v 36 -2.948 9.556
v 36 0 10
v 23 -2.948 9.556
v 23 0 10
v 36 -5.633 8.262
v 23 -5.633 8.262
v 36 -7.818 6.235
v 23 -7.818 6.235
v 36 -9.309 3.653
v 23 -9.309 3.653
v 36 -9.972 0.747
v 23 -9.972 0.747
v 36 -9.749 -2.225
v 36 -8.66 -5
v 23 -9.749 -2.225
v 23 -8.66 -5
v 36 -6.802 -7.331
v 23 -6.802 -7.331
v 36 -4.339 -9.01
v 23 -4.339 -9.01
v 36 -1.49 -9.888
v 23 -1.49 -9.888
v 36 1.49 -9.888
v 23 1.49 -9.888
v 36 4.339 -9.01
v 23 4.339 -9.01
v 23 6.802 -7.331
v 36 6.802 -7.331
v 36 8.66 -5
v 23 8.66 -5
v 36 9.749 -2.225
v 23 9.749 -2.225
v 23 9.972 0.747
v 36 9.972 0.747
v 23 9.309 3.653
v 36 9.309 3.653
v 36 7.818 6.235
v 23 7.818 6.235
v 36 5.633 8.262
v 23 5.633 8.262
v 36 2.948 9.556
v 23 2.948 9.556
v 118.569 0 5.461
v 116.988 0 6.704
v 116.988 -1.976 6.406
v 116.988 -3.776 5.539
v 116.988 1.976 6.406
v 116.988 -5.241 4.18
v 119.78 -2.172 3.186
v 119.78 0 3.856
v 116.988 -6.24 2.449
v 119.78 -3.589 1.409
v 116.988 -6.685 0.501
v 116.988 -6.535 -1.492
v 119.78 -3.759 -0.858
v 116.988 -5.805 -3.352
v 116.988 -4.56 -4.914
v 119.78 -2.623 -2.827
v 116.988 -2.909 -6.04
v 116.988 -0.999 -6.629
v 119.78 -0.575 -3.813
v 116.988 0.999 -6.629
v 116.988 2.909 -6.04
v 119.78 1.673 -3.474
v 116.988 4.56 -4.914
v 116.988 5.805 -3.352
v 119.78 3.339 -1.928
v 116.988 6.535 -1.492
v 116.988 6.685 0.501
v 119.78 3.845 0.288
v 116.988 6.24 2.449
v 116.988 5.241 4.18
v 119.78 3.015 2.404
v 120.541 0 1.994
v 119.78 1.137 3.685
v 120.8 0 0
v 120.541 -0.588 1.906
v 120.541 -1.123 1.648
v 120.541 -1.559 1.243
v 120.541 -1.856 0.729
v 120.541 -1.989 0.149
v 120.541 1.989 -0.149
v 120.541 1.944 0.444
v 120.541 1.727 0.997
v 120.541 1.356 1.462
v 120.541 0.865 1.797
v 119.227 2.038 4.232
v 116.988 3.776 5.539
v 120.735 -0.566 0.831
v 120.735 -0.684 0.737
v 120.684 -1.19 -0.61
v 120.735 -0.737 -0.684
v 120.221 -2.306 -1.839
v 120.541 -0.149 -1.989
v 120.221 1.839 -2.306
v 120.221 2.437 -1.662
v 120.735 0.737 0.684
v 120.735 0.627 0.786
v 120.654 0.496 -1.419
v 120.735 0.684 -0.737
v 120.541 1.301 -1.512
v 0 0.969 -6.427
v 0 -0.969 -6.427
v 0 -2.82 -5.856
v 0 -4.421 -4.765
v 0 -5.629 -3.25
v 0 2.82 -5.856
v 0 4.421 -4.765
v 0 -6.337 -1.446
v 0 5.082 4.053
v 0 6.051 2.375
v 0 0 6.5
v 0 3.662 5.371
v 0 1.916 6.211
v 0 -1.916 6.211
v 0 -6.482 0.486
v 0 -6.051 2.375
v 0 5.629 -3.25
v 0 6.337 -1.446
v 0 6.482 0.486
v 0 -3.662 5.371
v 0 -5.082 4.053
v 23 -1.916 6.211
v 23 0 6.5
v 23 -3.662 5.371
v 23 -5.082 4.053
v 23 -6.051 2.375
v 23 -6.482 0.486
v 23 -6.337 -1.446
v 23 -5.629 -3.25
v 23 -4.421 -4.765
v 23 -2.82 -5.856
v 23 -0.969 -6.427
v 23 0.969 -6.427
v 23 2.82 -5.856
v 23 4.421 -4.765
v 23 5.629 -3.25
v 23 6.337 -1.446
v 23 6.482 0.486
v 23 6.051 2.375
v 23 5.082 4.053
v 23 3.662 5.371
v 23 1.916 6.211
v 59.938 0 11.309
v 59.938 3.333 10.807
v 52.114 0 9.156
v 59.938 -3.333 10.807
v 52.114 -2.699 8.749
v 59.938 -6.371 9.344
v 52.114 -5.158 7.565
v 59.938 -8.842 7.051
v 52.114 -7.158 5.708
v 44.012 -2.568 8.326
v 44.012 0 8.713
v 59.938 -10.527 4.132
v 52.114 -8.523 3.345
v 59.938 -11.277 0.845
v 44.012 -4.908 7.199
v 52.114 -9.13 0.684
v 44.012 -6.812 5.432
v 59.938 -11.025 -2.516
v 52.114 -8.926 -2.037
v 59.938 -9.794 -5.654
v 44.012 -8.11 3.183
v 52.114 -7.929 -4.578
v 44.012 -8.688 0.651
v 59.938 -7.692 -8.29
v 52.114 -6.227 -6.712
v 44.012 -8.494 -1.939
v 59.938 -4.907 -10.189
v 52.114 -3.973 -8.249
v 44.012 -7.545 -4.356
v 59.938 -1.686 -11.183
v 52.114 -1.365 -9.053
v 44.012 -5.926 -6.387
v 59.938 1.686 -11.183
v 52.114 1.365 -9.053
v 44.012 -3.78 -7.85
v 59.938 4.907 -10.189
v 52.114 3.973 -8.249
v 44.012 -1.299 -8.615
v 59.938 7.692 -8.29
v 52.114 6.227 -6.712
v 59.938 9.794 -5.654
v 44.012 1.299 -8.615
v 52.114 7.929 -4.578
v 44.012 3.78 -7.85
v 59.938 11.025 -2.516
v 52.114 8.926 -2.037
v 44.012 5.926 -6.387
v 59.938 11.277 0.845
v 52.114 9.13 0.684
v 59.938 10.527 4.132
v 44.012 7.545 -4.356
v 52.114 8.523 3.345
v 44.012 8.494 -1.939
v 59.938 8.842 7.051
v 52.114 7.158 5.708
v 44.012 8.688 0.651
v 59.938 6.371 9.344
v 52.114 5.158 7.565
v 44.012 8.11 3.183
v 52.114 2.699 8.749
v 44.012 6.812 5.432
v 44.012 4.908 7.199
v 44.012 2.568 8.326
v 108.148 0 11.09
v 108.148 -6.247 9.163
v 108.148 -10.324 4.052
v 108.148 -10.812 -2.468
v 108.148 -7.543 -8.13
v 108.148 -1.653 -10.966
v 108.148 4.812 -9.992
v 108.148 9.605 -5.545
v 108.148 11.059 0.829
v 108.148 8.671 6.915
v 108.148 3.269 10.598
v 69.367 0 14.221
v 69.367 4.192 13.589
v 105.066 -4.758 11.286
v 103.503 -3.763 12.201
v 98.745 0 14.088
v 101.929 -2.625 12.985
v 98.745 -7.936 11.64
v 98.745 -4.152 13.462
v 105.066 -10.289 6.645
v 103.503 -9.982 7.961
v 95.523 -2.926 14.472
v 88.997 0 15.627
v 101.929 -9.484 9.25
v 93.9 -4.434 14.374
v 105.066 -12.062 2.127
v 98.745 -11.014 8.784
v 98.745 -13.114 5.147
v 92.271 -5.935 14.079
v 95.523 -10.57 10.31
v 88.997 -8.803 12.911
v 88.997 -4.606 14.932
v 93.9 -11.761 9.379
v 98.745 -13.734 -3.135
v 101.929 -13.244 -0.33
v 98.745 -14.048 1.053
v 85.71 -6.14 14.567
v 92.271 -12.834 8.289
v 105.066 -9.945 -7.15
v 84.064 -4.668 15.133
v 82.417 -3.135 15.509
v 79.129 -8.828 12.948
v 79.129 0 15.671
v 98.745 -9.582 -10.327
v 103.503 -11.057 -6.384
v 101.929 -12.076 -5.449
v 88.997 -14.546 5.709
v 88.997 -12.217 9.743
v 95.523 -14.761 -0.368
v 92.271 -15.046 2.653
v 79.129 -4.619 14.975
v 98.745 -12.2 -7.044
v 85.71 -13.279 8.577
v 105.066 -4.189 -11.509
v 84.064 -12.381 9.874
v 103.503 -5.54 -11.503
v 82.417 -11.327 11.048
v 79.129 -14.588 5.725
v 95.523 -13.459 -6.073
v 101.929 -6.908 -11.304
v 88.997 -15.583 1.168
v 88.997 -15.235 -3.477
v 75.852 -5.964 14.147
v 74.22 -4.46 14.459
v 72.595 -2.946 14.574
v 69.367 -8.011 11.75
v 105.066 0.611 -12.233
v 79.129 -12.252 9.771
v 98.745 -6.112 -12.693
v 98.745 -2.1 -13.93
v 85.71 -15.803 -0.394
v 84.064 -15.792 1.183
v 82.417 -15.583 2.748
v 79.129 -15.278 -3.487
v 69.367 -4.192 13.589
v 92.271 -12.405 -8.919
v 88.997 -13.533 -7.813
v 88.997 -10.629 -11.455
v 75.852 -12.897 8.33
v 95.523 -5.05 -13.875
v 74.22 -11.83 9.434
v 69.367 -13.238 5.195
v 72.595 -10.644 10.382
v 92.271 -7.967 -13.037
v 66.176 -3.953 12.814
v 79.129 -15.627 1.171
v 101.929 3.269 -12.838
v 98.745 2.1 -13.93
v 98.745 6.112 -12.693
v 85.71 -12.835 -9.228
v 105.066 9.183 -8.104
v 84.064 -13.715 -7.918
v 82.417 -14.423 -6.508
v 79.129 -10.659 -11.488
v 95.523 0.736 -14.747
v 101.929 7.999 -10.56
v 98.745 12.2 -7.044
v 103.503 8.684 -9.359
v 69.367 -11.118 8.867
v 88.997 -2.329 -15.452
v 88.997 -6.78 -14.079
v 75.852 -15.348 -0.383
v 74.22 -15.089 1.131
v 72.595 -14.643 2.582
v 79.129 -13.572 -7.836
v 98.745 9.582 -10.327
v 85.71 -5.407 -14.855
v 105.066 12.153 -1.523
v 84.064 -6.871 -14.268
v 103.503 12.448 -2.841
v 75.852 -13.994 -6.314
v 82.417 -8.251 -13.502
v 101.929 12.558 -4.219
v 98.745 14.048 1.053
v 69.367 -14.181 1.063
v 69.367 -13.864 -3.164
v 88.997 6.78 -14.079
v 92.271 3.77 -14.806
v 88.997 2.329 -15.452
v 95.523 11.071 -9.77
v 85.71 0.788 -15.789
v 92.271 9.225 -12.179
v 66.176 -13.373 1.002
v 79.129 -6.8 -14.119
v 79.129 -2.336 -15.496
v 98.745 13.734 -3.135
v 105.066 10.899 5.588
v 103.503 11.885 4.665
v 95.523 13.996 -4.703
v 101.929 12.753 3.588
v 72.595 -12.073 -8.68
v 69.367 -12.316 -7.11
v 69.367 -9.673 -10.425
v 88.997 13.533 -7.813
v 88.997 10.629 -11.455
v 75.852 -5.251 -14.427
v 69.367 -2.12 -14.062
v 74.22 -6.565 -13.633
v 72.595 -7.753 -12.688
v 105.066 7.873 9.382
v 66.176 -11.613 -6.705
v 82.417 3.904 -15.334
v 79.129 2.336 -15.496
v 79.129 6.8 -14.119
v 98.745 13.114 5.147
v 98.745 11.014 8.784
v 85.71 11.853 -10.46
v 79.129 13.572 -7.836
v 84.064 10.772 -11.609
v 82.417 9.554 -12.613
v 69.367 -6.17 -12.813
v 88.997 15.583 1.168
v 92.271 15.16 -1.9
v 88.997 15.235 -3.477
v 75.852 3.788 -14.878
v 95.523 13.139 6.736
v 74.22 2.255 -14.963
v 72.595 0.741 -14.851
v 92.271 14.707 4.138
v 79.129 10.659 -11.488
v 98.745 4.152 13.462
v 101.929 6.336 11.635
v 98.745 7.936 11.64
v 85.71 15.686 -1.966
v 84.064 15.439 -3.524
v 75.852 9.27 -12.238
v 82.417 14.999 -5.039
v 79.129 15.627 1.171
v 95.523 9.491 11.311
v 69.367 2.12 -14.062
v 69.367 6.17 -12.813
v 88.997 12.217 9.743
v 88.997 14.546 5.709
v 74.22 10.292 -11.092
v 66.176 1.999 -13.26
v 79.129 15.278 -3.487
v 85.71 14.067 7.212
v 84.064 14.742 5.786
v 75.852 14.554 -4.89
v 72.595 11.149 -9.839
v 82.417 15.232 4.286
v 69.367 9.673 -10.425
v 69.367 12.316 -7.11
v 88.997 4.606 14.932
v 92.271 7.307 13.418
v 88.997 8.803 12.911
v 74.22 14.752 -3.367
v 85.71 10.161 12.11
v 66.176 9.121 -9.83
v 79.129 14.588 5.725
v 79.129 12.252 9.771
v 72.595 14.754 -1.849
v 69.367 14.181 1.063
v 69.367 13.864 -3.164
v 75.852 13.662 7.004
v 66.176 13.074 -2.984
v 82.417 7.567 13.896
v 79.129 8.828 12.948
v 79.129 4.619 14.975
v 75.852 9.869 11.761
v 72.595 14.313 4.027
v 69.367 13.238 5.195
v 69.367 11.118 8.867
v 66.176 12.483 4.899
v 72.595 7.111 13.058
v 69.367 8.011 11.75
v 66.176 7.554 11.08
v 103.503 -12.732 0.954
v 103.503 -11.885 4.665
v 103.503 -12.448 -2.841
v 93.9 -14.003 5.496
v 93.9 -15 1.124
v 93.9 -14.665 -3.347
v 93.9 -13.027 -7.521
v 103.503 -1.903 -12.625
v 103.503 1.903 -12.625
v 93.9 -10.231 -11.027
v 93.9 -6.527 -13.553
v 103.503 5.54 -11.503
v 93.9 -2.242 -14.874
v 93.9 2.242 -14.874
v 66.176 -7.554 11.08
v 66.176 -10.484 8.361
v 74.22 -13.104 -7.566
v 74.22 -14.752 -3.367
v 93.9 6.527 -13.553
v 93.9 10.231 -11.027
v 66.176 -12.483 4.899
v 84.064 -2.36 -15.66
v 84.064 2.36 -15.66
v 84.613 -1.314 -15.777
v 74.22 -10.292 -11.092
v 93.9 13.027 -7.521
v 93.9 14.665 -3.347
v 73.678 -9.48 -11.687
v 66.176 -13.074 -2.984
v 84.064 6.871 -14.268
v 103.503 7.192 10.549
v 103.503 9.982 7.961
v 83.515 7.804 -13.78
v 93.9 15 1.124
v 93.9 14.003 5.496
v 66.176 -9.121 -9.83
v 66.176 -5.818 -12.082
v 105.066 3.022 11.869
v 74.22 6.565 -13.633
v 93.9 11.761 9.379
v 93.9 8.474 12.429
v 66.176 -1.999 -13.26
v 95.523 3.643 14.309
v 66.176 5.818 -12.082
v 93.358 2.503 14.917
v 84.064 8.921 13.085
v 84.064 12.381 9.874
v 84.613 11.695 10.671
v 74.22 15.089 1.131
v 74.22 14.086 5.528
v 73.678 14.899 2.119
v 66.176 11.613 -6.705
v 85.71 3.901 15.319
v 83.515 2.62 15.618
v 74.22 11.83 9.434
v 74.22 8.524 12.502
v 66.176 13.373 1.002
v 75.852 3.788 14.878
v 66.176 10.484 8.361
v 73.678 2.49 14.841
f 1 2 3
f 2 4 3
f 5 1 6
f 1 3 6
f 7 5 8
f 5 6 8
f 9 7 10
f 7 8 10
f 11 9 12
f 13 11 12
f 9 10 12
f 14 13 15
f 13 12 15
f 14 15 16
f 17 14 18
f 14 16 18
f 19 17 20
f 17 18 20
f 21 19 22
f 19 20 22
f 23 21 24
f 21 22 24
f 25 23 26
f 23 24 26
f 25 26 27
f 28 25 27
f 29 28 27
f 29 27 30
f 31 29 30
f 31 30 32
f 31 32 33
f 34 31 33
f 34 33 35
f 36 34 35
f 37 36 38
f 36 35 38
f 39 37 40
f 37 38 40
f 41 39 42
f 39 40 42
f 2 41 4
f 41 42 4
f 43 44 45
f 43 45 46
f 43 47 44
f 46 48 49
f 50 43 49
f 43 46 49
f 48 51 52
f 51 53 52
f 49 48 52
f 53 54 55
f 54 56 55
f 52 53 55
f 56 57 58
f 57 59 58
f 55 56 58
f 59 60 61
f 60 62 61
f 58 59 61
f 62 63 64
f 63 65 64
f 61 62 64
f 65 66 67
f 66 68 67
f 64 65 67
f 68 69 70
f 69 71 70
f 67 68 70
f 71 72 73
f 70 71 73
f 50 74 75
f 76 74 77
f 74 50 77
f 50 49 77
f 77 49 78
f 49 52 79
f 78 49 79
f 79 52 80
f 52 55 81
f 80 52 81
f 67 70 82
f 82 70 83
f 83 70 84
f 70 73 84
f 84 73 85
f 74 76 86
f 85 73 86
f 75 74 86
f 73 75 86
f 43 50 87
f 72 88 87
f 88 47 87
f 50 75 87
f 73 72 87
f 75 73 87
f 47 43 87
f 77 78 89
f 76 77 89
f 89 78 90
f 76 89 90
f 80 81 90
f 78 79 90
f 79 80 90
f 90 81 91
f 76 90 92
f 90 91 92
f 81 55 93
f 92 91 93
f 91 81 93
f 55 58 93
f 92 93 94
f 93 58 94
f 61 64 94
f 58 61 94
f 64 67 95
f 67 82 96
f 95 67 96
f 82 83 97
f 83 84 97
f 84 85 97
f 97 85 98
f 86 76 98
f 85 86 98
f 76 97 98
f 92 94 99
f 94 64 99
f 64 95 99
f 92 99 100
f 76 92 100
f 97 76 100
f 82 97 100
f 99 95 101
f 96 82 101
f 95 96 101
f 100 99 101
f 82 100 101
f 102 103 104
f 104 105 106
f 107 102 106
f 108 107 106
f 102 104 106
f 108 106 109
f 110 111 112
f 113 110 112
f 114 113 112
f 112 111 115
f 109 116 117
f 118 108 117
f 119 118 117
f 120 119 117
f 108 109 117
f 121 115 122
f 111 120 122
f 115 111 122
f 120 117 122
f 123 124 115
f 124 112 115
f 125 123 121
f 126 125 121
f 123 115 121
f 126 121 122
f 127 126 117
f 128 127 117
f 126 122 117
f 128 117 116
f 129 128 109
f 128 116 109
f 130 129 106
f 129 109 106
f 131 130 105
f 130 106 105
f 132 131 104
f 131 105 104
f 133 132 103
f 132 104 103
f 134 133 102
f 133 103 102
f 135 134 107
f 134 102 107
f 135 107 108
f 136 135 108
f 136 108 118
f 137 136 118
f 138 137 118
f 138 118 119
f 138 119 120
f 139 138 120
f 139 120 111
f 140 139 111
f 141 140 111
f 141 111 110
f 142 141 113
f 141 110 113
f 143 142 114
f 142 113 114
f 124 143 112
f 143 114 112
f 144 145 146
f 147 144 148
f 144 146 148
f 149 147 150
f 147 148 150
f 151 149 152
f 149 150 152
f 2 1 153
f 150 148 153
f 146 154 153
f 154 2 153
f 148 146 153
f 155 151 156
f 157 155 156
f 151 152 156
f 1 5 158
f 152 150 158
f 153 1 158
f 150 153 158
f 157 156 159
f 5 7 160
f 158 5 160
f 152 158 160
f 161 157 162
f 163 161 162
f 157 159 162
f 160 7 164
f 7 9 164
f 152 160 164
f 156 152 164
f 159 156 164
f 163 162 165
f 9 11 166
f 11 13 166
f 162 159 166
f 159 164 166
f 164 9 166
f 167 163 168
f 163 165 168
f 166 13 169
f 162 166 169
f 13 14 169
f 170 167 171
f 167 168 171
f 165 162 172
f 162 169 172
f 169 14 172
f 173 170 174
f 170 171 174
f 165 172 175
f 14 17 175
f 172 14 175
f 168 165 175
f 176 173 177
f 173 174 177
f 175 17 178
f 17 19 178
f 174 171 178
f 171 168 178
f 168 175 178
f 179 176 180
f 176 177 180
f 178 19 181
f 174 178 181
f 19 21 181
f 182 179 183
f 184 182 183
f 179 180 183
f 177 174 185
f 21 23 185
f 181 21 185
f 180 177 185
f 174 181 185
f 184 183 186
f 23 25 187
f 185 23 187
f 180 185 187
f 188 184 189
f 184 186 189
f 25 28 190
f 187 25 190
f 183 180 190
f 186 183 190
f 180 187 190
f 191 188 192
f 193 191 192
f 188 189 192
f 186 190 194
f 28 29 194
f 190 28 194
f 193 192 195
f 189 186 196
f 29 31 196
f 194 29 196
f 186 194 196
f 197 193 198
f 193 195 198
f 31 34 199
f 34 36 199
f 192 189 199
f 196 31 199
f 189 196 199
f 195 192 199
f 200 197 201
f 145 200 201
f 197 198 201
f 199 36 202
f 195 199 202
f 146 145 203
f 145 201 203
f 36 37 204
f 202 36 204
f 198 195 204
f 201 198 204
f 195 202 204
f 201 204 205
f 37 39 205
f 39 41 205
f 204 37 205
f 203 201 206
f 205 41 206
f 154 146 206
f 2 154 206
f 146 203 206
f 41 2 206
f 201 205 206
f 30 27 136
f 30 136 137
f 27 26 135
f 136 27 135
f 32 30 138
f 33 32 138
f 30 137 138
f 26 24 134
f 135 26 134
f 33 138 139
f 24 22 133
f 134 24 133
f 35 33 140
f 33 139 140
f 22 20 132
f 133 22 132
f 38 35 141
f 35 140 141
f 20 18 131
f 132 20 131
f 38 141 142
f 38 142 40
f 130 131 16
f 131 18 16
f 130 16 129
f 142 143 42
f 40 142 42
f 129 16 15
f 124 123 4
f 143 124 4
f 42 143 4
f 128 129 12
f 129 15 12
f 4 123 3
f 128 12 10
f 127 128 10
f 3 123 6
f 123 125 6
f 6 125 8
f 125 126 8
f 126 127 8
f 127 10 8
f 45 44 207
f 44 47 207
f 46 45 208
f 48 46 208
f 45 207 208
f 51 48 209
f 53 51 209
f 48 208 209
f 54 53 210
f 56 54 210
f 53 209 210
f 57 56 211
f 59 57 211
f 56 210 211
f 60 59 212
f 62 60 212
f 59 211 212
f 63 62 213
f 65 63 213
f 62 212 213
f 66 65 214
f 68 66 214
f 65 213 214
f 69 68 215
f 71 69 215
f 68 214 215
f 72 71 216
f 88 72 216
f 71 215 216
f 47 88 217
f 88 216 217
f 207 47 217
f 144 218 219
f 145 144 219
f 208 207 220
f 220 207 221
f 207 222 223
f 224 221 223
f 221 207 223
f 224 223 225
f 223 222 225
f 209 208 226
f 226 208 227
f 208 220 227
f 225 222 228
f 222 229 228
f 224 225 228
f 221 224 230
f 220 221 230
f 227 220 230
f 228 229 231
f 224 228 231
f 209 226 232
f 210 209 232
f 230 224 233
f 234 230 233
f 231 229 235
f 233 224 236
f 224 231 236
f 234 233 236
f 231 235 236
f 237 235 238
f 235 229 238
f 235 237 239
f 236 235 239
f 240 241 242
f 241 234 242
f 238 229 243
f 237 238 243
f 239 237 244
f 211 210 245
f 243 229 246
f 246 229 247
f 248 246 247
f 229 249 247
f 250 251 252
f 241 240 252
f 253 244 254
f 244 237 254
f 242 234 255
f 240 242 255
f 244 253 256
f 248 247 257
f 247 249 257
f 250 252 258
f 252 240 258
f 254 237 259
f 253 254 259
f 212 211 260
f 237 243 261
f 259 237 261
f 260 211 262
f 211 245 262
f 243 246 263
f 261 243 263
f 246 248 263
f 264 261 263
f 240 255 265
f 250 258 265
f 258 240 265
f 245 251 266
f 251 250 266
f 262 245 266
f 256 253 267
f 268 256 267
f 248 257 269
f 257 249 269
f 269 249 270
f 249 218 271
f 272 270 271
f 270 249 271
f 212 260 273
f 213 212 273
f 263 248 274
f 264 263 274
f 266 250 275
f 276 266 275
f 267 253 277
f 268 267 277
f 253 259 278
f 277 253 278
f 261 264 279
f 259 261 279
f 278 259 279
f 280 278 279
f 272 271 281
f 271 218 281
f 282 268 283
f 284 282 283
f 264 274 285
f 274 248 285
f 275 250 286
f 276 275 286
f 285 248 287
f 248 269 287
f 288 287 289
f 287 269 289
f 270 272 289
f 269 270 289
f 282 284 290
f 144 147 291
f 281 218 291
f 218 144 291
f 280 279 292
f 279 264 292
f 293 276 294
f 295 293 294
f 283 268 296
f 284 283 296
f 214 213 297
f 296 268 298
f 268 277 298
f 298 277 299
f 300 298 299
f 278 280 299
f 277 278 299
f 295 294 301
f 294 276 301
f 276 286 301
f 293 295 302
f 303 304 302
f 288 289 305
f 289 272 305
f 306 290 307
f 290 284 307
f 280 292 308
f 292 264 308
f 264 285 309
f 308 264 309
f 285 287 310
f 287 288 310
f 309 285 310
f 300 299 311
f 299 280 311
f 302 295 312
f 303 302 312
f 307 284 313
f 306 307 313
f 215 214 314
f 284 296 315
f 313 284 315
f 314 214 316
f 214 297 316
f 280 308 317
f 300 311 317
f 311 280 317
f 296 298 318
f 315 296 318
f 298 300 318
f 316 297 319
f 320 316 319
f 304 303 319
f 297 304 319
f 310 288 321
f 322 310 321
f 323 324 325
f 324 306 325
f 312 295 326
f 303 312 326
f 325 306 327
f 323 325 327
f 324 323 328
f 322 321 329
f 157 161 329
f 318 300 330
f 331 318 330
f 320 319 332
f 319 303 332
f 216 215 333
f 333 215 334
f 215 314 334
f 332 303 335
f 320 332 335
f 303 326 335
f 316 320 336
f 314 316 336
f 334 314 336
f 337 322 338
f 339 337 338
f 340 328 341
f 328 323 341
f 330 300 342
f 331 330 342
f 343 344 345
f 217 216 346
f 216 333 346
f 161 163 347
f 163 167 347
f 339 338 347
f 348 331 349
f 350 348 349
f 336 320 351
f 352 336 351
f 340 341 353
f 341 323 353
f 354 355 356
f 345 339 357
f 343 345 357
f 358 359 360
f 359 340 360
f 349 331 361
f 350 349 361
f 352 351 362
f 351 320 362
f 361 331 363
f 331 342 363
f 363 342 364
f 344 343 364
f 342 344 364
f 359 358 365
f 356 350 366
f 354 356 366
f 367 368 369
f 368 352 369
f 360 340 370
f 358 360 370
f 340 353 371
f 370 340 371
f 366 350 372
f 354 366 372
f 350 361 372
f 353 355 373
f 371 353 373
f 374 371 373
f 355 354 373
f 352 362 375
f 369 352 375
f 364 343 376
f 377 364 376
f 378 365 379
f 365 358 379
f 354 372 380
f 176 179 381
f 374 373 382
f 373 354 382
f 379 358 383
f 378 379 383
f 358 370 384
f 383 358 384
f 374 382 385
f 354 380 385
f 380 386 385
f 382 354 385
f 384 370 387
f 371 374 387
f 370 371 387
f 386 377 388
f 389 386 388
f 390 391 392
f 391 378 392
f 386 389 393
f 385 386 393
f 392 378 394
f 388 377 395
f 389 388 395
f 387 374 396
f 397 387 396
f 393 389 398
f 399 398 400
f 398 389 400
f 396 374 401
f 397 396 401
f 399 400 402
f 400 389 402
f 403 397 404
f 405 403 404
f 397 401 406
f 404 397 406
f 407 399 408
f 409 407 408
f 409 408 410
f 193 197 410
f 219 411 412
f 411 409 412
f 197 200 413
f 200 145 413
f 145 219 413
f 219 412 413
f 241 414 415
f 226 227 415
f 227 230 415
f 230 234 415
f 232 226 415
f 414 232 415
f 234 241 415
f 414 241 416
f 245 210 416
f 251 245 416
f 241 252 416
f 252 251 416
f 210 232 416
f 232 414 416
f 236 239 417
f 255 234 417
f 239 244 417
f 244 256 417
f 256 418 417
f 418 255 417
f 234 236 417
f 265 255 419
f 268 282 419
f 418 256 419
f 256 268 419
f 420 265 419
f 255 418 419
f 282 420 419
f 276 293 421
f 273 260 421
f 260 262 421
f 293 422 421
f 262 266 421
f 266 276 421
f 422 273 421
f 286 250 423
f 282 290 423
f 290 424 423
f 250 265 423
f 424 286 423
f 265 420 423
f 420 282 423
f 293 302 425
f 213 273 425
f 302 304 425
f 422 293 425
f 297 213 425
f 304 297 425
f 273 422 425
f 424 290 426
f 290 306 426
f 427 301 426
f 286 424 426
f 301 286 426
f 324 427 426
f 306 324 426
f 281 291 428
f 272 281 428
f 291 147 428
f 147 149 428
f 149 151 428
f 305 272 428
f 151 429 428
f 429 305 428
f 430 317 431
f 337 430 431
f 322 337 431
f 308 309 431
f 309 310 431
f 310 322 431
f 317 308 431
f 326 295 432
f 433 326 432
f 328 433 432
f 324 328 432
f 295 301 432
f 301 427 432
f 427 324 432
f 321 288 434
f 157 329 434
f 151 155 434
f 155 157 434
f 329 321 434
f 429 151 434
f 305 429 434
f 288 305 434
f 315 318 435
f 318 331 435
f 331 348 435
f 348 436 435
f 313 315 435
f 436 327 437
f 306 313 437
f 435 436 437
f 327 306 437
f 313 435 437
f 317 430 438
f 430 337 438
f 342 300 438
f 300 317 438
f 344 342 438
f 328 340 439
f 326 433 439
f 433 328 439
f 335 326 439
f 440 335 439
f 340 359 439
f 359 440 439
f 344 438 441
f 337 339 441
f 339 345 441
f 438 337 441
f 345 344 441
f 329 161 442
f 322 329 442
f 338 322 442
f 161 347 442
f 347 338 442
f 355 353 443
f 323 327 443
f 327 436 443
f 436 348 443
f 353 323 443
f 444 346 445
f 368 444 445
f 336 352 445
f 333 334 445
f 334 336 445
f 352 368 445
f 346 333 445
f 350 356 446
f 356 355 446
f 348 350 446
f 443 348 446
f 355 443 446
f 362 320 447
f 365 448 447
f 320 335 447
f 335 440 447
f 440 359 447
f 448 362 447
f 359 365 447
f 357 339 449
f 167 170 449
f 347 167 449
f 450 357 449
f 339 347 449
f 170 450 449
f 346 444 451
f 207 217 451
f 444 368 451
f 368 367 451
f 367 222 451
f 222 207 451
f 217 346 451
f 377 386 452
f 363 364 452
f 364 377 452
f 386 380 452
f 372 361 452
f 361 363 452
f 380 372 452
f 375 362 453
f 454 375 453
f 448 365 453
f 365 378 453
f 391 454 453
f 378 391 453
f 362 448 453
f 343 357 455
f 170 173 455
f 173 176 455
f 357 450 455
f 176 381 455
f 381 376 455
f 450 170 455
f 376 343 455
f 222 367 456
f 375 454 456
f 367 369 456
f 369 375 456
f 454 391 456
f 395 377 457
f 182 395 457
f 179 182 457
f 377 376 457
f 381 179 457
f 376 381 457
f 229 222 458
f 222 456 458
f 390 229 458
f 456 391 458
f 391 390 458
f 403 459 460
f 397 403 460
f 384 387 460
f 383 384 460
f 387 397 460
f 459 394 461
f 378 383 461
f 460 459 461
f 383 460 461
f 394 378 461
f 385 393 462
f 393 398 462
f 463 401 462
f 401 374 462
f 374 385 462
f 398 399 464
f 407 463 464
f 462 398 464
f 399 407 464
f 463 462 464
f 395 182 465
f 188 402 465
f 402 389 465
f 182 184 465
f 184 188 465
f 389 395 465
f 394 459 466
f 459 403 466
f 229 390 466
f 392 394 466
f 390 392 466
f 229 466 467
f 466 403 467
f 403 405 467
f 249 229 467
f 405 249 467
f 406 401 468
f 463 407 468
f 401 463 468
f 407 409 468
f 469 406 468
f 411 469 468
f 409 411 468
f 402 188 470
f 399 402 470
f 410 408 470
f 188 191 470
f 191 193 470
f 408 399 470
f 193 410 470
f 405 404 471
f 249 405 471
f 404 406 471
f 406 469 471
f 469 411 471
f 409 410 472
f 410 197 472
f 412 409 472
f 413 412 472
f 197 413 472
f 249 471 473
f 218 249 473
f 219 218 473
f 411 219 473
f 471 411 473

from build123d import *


with BuildPart() as f1:
    # F0 (on Front) → F1 (revolve)
    with BuildSketch(Plane.XZ):
        with BuildLine():
            Line((0, 6.5), (0, 0))
            Line((0, 0), (120.8, 0))
            ThreePointArc((120.8, 0), (119.780303, 3.855839), (116.987822, 6.703527))
            ThreePointArc((116.987822, 6.703527), (88.997191, 15.626515), (59.937706, 11.308939))
            ThreePointArc((59.937706, 11.308939), (48.07478, 8.717289), (36, 10))
            Line((36, 10), (23, 10))
            Line((23, 10), (23, 6.5))
            Line((23, 6.5), (0, 6.5))
        make_face()
    revolve(axis=Axis((60.4, 0, 0), (1, 0, 0)))


solid = f1.part
